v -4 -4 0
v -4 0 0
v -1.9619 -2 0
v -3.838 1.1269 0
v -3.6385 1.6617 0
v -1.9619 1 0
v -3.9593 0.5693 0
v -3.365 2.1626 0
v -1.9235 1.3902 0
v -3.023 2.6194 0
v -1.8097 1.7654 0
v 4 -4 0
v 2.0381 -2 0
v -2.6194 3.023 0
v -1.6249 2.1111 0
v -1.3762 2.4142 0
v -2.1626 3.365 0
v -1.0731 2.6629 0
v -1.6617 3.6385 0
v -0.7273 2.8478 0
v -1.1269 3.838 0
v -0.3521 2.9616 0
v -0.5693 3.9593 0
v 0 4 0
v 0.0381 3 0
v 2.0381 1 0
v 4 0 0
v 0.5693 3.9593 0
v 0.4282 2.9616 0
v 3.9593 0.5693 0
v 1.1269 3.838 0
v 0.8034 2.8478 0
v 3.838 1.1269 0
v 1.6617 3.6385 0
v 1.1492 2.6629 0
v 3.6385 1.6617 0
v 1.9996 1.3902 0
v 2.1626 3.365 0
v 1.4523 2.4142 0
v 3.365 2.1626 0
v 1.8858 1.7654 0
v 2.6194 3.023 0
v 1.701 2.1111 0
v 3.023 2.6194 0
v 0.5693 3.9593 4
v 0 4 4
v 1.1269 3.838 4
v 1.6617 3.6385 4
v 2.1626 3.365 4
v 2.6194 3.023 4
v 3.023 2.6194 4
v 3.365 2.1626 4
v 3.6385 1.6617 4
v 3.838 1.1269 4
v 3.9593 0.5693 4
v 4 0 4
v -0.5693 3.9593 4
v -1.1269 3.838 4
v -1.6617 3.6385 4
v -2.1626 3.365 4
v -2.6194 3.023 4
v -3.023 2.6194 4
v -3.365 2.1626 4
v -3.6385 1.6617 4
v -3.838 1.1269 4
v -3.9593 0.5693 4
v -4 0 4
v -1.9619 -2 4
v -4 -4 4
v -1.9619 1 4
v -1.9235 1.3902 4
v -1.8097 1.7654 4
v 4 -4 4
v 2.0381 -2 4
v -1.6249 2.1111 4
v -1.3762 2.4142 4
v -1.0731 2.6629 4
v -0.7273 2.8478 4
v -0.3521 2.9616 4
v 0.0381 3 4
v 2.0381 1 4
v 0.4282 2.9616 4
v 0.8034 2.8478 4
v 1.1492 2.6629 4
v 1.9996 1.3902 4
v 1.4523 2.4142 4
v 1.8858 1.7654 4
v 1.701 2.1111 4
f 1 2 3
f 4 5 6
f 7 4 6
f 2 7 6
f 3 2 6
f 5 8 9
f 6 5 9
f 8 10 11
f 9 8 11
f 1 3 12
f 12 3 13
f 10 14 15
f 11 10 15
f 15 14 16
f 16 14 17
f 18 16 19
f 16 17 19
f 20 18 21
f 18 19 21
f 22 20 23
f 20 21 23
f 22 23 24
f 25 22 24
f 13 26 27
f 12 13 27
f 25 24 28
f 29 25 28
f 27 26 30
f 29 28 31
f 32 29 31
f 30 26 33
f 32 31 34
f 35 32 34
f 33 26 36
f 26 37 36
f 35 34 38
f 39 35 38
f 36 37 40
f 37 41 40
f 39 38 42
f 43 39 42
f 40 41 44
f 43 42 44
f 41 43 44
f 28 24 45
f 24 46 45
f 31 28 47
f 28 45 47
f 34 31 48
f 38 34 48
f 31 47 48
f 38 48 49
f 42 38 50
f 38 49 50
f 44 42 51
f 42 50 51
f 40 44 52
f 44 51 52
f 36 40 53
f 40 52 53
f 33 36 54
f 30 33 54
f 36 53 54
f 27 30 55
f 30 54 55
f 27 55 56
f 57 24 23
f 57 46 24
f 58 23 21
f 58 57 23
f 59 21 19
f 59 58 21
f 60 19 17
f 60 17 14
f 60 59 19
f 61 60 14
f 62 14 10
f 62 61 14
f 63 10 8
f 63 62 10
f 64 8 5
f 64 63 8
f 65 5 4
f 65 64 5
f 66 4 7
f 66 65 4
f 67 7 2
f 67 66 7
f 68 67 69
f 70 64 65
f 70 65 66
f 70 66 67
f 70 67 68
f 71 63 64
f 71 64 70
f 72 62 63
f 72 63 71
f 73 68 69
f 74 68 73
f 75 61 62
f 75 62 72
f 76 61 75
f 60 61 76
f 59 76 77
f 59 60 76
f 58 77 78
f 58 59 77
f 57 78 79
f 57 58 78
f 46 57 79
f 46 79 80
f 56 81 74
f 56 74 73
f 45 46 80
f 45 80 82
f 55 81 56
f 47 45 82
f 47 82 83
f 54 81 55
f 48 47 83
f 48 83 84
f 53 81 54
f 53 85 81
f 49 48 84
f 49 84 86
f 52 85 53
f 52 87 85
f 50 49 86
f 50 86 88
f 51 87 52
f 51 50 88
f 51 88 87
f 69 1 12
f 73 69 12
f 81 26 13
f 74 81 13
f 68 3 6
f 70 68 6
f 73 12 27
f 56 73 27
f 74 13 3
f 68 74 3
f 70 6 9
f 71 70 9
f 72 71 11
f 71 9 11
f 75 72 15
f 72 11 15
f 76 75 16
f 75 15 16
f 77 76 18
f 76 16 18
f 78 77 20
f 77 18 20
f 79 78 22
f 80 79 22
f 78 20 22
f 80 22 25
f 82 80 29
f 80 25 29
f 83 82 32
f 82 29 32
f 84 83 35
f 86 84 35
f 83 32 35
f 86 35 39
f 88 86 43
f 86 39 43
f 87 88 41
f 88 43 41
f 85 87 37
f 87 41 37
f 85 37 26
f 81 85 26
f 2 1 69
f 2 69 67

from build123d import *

# Parameters (mm, degrees)
F0_W     = 8
F0_H     = 8
F1_DEPTH = 4
F2_R     = 4
F3_R     = 3.99999


# Not quite as in the source:
# - a fillet or chamfer is up to 0.001 mm smaller than in the source, because OpenCascade refuses the exact size


with BuildPart() as f1:
    # F0 (on Top) → F1 (new body)
    with BuildSketch(Plane.XY):
        Rectangle(F0_W, F0_H)
        with BuildLine():
            Line((-1.9619476116, -2), (-1.9619476116, 1))
            ThreePointArc((-1.9619476116, 1), (0.0380527829, 2.9999996055), (2.0380523884, 0.9999992109))
            Line((2.0380523884, 0.9999992109), (2.0380523884, -2))
            Line((2.0380523884, -2), (-1.9619476116, -2))
        make_face(mode=Mode.SUBTRACT)
    extrude(amount=F1_DEPTH)

    # F2
    f2_edges = [f1.edges().sort_by_distance(p)[0] for p in [
        (4, 4, 2),
    ]]
    fillet(f2_edges, radius=F2_R)

    # F3 (radius 4 in the source; OpenCascade refuses exactly that, so slightly less here)
    f3_edges = [f1.edges().sort_by_distance(p)[0] for p in [
        (-4, 4, 2),
    ]]
    fillet(f3_edges, radius=F3_R)


solid = f1.part
